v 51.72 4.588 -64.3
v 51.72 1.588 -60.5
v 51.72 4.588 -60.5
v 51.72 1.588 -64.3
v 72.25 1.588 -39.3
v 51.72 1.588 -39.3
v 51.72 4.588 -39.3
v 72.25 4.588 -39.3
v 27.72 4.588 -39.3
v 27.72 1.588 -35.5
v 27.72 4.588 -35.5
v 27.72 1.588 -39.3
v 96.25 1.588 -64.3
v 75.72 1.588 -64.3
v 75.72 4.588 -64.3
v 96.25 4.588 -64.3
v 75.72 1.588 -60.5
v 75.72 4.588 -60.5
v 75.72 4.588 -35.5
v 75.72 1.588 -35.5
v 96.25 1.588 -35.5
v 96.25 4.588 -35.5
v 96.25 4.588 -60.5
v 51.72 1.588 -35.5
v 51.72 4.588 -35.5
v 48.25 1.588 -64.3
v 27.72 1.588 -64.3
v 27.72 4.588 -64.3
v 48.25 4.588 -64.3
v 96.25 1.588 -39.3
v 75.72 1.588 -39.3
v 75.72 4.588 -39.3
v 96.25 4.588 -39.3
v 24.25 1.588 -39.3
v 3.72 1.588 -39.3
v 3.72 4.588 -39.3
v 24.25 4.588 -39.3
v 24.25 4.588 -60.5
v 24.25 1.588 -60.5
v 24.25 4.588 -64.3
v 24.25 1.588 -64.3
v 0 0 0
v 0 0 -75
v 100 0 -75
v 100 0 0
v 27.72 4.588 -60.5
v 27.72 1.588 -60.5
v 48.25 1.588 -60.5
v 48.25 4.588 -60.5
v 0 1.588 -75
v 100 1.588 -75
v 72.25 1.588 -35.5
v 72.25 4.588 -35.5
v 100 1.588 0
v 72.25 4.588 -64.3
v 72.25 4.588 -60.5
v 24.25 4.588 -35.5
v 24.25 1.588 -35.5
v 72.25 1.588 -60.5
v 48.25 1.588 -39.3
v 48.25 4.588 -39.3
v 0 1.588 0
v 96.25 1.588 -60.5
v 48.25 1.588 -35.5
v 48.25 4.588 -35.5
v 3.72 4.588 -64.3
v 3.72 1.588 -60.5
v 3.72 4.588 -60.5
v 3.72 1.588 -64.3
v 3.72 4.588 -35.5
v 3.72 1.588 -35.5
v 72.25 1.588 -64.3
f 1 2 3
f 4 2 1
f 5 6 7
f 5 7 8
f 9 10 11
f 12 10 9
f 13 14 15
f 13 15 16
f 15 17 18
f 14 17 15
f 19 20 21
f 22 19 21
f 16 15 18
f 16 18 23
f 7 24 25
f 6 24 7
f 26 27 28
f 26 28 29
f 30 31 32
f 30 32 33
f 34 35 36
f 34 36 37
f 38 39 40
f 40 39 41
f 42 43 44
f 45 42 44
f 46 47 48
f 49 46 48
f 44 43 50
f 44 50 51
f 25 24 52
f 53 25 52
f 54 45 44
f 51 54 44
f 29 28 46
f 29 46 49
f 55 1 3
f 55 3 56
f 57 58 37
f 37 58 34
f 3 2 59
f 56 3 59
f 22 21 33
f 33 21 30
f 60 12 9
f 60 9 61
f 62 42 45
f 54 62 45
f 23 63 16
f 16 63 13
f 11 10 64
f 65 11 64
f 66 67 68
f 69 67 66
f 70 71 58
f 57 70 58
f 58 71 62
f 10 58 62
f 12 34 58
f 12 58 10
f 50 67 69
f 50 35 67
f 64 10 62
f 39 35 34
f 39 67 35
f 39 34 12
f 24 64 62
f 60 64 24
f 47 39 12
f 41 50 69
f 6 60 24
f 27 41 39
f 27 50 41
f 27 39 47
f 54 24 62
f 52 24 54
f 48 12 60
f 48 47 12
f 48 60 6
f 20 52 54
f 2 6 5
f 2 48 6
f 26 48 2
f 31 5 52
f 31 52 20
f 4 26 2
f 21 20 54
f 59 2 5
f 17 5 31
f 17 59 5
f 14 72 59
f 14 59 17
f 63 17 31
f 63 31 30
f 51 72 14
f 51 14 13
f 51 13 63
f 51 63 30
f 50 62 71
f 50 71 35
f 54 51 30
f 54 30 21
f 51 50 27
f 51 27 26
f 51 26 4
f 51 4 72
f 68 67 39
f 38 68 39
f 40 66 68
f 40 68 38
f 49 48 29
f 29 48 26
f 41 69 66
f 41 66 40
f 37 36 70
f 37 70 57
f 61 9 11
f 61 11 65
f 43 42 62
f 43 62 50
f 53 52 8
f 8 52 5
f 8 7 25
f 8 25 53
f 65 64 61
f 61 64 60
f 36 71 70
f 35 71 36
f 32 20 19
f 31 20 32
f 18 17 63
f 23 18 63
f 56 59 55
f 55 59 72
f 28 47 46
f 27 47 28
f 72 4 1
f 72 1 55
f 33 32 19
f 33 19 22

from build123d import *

# Parameters (mm, degrees)
SKETCH1_W            = 100
SKETCH1_H            = 75
BOSS_EXTRUDE1_DEPTH  = 1.5875
SKETCH2_W            = 20.53
SKETCH2_H            = 3.8
BOSS_EXTRUDE2_DEPTH  = 4.5875
LPATTERN1_COUNT      = 4
LPATTERN1_PITCH      = 24
LPATTERN1_COUNT_DIR2 = 2
LPATTERN1_PITCH_DIR2 = 25


with BuildPart() as part:
    # Sketch1 → Boss-Extrude1 (new body)
    with BuildSketch(Plane(origin=(0, 0, 0), x_dir=(1, 0, 0), z_dir=(0, 1, 0))):
        with Locations((50, 37.5)):
            Rectangle(SKETCH1_W, SKETCH1_H)
    extrude(amount=BOSS_EXTRUDE1_DEPTH)

    # Sketch2 → Boss-Extrude2 (add)
    with BuildSketch(Plane(origin=(0, 0, 0), x_dir=(1, 0, 0), z_dir=(0, 1, 0))):
        with Locations((13.985, 37.4)):
            Rectangle(SKETCH2_W, SKETCH2_H)
    boss_extrude2 = extrude(amount=BOSS_EXTRUDE2_DEPTH)

    # LPattern1: Boss-Extrude2 4 × 2
    with Locations(*[(i * LPATTERN1_PITCH, 0, -j * LPATTERN1_PITCH_DIR2) for i in range(LPATTERN1_COUNT) for j in range(LPATTERN1_COUNT_DIR2) if (i, j) != (0, 0)]):
        add(boss_extrude2)


solid = part.part
